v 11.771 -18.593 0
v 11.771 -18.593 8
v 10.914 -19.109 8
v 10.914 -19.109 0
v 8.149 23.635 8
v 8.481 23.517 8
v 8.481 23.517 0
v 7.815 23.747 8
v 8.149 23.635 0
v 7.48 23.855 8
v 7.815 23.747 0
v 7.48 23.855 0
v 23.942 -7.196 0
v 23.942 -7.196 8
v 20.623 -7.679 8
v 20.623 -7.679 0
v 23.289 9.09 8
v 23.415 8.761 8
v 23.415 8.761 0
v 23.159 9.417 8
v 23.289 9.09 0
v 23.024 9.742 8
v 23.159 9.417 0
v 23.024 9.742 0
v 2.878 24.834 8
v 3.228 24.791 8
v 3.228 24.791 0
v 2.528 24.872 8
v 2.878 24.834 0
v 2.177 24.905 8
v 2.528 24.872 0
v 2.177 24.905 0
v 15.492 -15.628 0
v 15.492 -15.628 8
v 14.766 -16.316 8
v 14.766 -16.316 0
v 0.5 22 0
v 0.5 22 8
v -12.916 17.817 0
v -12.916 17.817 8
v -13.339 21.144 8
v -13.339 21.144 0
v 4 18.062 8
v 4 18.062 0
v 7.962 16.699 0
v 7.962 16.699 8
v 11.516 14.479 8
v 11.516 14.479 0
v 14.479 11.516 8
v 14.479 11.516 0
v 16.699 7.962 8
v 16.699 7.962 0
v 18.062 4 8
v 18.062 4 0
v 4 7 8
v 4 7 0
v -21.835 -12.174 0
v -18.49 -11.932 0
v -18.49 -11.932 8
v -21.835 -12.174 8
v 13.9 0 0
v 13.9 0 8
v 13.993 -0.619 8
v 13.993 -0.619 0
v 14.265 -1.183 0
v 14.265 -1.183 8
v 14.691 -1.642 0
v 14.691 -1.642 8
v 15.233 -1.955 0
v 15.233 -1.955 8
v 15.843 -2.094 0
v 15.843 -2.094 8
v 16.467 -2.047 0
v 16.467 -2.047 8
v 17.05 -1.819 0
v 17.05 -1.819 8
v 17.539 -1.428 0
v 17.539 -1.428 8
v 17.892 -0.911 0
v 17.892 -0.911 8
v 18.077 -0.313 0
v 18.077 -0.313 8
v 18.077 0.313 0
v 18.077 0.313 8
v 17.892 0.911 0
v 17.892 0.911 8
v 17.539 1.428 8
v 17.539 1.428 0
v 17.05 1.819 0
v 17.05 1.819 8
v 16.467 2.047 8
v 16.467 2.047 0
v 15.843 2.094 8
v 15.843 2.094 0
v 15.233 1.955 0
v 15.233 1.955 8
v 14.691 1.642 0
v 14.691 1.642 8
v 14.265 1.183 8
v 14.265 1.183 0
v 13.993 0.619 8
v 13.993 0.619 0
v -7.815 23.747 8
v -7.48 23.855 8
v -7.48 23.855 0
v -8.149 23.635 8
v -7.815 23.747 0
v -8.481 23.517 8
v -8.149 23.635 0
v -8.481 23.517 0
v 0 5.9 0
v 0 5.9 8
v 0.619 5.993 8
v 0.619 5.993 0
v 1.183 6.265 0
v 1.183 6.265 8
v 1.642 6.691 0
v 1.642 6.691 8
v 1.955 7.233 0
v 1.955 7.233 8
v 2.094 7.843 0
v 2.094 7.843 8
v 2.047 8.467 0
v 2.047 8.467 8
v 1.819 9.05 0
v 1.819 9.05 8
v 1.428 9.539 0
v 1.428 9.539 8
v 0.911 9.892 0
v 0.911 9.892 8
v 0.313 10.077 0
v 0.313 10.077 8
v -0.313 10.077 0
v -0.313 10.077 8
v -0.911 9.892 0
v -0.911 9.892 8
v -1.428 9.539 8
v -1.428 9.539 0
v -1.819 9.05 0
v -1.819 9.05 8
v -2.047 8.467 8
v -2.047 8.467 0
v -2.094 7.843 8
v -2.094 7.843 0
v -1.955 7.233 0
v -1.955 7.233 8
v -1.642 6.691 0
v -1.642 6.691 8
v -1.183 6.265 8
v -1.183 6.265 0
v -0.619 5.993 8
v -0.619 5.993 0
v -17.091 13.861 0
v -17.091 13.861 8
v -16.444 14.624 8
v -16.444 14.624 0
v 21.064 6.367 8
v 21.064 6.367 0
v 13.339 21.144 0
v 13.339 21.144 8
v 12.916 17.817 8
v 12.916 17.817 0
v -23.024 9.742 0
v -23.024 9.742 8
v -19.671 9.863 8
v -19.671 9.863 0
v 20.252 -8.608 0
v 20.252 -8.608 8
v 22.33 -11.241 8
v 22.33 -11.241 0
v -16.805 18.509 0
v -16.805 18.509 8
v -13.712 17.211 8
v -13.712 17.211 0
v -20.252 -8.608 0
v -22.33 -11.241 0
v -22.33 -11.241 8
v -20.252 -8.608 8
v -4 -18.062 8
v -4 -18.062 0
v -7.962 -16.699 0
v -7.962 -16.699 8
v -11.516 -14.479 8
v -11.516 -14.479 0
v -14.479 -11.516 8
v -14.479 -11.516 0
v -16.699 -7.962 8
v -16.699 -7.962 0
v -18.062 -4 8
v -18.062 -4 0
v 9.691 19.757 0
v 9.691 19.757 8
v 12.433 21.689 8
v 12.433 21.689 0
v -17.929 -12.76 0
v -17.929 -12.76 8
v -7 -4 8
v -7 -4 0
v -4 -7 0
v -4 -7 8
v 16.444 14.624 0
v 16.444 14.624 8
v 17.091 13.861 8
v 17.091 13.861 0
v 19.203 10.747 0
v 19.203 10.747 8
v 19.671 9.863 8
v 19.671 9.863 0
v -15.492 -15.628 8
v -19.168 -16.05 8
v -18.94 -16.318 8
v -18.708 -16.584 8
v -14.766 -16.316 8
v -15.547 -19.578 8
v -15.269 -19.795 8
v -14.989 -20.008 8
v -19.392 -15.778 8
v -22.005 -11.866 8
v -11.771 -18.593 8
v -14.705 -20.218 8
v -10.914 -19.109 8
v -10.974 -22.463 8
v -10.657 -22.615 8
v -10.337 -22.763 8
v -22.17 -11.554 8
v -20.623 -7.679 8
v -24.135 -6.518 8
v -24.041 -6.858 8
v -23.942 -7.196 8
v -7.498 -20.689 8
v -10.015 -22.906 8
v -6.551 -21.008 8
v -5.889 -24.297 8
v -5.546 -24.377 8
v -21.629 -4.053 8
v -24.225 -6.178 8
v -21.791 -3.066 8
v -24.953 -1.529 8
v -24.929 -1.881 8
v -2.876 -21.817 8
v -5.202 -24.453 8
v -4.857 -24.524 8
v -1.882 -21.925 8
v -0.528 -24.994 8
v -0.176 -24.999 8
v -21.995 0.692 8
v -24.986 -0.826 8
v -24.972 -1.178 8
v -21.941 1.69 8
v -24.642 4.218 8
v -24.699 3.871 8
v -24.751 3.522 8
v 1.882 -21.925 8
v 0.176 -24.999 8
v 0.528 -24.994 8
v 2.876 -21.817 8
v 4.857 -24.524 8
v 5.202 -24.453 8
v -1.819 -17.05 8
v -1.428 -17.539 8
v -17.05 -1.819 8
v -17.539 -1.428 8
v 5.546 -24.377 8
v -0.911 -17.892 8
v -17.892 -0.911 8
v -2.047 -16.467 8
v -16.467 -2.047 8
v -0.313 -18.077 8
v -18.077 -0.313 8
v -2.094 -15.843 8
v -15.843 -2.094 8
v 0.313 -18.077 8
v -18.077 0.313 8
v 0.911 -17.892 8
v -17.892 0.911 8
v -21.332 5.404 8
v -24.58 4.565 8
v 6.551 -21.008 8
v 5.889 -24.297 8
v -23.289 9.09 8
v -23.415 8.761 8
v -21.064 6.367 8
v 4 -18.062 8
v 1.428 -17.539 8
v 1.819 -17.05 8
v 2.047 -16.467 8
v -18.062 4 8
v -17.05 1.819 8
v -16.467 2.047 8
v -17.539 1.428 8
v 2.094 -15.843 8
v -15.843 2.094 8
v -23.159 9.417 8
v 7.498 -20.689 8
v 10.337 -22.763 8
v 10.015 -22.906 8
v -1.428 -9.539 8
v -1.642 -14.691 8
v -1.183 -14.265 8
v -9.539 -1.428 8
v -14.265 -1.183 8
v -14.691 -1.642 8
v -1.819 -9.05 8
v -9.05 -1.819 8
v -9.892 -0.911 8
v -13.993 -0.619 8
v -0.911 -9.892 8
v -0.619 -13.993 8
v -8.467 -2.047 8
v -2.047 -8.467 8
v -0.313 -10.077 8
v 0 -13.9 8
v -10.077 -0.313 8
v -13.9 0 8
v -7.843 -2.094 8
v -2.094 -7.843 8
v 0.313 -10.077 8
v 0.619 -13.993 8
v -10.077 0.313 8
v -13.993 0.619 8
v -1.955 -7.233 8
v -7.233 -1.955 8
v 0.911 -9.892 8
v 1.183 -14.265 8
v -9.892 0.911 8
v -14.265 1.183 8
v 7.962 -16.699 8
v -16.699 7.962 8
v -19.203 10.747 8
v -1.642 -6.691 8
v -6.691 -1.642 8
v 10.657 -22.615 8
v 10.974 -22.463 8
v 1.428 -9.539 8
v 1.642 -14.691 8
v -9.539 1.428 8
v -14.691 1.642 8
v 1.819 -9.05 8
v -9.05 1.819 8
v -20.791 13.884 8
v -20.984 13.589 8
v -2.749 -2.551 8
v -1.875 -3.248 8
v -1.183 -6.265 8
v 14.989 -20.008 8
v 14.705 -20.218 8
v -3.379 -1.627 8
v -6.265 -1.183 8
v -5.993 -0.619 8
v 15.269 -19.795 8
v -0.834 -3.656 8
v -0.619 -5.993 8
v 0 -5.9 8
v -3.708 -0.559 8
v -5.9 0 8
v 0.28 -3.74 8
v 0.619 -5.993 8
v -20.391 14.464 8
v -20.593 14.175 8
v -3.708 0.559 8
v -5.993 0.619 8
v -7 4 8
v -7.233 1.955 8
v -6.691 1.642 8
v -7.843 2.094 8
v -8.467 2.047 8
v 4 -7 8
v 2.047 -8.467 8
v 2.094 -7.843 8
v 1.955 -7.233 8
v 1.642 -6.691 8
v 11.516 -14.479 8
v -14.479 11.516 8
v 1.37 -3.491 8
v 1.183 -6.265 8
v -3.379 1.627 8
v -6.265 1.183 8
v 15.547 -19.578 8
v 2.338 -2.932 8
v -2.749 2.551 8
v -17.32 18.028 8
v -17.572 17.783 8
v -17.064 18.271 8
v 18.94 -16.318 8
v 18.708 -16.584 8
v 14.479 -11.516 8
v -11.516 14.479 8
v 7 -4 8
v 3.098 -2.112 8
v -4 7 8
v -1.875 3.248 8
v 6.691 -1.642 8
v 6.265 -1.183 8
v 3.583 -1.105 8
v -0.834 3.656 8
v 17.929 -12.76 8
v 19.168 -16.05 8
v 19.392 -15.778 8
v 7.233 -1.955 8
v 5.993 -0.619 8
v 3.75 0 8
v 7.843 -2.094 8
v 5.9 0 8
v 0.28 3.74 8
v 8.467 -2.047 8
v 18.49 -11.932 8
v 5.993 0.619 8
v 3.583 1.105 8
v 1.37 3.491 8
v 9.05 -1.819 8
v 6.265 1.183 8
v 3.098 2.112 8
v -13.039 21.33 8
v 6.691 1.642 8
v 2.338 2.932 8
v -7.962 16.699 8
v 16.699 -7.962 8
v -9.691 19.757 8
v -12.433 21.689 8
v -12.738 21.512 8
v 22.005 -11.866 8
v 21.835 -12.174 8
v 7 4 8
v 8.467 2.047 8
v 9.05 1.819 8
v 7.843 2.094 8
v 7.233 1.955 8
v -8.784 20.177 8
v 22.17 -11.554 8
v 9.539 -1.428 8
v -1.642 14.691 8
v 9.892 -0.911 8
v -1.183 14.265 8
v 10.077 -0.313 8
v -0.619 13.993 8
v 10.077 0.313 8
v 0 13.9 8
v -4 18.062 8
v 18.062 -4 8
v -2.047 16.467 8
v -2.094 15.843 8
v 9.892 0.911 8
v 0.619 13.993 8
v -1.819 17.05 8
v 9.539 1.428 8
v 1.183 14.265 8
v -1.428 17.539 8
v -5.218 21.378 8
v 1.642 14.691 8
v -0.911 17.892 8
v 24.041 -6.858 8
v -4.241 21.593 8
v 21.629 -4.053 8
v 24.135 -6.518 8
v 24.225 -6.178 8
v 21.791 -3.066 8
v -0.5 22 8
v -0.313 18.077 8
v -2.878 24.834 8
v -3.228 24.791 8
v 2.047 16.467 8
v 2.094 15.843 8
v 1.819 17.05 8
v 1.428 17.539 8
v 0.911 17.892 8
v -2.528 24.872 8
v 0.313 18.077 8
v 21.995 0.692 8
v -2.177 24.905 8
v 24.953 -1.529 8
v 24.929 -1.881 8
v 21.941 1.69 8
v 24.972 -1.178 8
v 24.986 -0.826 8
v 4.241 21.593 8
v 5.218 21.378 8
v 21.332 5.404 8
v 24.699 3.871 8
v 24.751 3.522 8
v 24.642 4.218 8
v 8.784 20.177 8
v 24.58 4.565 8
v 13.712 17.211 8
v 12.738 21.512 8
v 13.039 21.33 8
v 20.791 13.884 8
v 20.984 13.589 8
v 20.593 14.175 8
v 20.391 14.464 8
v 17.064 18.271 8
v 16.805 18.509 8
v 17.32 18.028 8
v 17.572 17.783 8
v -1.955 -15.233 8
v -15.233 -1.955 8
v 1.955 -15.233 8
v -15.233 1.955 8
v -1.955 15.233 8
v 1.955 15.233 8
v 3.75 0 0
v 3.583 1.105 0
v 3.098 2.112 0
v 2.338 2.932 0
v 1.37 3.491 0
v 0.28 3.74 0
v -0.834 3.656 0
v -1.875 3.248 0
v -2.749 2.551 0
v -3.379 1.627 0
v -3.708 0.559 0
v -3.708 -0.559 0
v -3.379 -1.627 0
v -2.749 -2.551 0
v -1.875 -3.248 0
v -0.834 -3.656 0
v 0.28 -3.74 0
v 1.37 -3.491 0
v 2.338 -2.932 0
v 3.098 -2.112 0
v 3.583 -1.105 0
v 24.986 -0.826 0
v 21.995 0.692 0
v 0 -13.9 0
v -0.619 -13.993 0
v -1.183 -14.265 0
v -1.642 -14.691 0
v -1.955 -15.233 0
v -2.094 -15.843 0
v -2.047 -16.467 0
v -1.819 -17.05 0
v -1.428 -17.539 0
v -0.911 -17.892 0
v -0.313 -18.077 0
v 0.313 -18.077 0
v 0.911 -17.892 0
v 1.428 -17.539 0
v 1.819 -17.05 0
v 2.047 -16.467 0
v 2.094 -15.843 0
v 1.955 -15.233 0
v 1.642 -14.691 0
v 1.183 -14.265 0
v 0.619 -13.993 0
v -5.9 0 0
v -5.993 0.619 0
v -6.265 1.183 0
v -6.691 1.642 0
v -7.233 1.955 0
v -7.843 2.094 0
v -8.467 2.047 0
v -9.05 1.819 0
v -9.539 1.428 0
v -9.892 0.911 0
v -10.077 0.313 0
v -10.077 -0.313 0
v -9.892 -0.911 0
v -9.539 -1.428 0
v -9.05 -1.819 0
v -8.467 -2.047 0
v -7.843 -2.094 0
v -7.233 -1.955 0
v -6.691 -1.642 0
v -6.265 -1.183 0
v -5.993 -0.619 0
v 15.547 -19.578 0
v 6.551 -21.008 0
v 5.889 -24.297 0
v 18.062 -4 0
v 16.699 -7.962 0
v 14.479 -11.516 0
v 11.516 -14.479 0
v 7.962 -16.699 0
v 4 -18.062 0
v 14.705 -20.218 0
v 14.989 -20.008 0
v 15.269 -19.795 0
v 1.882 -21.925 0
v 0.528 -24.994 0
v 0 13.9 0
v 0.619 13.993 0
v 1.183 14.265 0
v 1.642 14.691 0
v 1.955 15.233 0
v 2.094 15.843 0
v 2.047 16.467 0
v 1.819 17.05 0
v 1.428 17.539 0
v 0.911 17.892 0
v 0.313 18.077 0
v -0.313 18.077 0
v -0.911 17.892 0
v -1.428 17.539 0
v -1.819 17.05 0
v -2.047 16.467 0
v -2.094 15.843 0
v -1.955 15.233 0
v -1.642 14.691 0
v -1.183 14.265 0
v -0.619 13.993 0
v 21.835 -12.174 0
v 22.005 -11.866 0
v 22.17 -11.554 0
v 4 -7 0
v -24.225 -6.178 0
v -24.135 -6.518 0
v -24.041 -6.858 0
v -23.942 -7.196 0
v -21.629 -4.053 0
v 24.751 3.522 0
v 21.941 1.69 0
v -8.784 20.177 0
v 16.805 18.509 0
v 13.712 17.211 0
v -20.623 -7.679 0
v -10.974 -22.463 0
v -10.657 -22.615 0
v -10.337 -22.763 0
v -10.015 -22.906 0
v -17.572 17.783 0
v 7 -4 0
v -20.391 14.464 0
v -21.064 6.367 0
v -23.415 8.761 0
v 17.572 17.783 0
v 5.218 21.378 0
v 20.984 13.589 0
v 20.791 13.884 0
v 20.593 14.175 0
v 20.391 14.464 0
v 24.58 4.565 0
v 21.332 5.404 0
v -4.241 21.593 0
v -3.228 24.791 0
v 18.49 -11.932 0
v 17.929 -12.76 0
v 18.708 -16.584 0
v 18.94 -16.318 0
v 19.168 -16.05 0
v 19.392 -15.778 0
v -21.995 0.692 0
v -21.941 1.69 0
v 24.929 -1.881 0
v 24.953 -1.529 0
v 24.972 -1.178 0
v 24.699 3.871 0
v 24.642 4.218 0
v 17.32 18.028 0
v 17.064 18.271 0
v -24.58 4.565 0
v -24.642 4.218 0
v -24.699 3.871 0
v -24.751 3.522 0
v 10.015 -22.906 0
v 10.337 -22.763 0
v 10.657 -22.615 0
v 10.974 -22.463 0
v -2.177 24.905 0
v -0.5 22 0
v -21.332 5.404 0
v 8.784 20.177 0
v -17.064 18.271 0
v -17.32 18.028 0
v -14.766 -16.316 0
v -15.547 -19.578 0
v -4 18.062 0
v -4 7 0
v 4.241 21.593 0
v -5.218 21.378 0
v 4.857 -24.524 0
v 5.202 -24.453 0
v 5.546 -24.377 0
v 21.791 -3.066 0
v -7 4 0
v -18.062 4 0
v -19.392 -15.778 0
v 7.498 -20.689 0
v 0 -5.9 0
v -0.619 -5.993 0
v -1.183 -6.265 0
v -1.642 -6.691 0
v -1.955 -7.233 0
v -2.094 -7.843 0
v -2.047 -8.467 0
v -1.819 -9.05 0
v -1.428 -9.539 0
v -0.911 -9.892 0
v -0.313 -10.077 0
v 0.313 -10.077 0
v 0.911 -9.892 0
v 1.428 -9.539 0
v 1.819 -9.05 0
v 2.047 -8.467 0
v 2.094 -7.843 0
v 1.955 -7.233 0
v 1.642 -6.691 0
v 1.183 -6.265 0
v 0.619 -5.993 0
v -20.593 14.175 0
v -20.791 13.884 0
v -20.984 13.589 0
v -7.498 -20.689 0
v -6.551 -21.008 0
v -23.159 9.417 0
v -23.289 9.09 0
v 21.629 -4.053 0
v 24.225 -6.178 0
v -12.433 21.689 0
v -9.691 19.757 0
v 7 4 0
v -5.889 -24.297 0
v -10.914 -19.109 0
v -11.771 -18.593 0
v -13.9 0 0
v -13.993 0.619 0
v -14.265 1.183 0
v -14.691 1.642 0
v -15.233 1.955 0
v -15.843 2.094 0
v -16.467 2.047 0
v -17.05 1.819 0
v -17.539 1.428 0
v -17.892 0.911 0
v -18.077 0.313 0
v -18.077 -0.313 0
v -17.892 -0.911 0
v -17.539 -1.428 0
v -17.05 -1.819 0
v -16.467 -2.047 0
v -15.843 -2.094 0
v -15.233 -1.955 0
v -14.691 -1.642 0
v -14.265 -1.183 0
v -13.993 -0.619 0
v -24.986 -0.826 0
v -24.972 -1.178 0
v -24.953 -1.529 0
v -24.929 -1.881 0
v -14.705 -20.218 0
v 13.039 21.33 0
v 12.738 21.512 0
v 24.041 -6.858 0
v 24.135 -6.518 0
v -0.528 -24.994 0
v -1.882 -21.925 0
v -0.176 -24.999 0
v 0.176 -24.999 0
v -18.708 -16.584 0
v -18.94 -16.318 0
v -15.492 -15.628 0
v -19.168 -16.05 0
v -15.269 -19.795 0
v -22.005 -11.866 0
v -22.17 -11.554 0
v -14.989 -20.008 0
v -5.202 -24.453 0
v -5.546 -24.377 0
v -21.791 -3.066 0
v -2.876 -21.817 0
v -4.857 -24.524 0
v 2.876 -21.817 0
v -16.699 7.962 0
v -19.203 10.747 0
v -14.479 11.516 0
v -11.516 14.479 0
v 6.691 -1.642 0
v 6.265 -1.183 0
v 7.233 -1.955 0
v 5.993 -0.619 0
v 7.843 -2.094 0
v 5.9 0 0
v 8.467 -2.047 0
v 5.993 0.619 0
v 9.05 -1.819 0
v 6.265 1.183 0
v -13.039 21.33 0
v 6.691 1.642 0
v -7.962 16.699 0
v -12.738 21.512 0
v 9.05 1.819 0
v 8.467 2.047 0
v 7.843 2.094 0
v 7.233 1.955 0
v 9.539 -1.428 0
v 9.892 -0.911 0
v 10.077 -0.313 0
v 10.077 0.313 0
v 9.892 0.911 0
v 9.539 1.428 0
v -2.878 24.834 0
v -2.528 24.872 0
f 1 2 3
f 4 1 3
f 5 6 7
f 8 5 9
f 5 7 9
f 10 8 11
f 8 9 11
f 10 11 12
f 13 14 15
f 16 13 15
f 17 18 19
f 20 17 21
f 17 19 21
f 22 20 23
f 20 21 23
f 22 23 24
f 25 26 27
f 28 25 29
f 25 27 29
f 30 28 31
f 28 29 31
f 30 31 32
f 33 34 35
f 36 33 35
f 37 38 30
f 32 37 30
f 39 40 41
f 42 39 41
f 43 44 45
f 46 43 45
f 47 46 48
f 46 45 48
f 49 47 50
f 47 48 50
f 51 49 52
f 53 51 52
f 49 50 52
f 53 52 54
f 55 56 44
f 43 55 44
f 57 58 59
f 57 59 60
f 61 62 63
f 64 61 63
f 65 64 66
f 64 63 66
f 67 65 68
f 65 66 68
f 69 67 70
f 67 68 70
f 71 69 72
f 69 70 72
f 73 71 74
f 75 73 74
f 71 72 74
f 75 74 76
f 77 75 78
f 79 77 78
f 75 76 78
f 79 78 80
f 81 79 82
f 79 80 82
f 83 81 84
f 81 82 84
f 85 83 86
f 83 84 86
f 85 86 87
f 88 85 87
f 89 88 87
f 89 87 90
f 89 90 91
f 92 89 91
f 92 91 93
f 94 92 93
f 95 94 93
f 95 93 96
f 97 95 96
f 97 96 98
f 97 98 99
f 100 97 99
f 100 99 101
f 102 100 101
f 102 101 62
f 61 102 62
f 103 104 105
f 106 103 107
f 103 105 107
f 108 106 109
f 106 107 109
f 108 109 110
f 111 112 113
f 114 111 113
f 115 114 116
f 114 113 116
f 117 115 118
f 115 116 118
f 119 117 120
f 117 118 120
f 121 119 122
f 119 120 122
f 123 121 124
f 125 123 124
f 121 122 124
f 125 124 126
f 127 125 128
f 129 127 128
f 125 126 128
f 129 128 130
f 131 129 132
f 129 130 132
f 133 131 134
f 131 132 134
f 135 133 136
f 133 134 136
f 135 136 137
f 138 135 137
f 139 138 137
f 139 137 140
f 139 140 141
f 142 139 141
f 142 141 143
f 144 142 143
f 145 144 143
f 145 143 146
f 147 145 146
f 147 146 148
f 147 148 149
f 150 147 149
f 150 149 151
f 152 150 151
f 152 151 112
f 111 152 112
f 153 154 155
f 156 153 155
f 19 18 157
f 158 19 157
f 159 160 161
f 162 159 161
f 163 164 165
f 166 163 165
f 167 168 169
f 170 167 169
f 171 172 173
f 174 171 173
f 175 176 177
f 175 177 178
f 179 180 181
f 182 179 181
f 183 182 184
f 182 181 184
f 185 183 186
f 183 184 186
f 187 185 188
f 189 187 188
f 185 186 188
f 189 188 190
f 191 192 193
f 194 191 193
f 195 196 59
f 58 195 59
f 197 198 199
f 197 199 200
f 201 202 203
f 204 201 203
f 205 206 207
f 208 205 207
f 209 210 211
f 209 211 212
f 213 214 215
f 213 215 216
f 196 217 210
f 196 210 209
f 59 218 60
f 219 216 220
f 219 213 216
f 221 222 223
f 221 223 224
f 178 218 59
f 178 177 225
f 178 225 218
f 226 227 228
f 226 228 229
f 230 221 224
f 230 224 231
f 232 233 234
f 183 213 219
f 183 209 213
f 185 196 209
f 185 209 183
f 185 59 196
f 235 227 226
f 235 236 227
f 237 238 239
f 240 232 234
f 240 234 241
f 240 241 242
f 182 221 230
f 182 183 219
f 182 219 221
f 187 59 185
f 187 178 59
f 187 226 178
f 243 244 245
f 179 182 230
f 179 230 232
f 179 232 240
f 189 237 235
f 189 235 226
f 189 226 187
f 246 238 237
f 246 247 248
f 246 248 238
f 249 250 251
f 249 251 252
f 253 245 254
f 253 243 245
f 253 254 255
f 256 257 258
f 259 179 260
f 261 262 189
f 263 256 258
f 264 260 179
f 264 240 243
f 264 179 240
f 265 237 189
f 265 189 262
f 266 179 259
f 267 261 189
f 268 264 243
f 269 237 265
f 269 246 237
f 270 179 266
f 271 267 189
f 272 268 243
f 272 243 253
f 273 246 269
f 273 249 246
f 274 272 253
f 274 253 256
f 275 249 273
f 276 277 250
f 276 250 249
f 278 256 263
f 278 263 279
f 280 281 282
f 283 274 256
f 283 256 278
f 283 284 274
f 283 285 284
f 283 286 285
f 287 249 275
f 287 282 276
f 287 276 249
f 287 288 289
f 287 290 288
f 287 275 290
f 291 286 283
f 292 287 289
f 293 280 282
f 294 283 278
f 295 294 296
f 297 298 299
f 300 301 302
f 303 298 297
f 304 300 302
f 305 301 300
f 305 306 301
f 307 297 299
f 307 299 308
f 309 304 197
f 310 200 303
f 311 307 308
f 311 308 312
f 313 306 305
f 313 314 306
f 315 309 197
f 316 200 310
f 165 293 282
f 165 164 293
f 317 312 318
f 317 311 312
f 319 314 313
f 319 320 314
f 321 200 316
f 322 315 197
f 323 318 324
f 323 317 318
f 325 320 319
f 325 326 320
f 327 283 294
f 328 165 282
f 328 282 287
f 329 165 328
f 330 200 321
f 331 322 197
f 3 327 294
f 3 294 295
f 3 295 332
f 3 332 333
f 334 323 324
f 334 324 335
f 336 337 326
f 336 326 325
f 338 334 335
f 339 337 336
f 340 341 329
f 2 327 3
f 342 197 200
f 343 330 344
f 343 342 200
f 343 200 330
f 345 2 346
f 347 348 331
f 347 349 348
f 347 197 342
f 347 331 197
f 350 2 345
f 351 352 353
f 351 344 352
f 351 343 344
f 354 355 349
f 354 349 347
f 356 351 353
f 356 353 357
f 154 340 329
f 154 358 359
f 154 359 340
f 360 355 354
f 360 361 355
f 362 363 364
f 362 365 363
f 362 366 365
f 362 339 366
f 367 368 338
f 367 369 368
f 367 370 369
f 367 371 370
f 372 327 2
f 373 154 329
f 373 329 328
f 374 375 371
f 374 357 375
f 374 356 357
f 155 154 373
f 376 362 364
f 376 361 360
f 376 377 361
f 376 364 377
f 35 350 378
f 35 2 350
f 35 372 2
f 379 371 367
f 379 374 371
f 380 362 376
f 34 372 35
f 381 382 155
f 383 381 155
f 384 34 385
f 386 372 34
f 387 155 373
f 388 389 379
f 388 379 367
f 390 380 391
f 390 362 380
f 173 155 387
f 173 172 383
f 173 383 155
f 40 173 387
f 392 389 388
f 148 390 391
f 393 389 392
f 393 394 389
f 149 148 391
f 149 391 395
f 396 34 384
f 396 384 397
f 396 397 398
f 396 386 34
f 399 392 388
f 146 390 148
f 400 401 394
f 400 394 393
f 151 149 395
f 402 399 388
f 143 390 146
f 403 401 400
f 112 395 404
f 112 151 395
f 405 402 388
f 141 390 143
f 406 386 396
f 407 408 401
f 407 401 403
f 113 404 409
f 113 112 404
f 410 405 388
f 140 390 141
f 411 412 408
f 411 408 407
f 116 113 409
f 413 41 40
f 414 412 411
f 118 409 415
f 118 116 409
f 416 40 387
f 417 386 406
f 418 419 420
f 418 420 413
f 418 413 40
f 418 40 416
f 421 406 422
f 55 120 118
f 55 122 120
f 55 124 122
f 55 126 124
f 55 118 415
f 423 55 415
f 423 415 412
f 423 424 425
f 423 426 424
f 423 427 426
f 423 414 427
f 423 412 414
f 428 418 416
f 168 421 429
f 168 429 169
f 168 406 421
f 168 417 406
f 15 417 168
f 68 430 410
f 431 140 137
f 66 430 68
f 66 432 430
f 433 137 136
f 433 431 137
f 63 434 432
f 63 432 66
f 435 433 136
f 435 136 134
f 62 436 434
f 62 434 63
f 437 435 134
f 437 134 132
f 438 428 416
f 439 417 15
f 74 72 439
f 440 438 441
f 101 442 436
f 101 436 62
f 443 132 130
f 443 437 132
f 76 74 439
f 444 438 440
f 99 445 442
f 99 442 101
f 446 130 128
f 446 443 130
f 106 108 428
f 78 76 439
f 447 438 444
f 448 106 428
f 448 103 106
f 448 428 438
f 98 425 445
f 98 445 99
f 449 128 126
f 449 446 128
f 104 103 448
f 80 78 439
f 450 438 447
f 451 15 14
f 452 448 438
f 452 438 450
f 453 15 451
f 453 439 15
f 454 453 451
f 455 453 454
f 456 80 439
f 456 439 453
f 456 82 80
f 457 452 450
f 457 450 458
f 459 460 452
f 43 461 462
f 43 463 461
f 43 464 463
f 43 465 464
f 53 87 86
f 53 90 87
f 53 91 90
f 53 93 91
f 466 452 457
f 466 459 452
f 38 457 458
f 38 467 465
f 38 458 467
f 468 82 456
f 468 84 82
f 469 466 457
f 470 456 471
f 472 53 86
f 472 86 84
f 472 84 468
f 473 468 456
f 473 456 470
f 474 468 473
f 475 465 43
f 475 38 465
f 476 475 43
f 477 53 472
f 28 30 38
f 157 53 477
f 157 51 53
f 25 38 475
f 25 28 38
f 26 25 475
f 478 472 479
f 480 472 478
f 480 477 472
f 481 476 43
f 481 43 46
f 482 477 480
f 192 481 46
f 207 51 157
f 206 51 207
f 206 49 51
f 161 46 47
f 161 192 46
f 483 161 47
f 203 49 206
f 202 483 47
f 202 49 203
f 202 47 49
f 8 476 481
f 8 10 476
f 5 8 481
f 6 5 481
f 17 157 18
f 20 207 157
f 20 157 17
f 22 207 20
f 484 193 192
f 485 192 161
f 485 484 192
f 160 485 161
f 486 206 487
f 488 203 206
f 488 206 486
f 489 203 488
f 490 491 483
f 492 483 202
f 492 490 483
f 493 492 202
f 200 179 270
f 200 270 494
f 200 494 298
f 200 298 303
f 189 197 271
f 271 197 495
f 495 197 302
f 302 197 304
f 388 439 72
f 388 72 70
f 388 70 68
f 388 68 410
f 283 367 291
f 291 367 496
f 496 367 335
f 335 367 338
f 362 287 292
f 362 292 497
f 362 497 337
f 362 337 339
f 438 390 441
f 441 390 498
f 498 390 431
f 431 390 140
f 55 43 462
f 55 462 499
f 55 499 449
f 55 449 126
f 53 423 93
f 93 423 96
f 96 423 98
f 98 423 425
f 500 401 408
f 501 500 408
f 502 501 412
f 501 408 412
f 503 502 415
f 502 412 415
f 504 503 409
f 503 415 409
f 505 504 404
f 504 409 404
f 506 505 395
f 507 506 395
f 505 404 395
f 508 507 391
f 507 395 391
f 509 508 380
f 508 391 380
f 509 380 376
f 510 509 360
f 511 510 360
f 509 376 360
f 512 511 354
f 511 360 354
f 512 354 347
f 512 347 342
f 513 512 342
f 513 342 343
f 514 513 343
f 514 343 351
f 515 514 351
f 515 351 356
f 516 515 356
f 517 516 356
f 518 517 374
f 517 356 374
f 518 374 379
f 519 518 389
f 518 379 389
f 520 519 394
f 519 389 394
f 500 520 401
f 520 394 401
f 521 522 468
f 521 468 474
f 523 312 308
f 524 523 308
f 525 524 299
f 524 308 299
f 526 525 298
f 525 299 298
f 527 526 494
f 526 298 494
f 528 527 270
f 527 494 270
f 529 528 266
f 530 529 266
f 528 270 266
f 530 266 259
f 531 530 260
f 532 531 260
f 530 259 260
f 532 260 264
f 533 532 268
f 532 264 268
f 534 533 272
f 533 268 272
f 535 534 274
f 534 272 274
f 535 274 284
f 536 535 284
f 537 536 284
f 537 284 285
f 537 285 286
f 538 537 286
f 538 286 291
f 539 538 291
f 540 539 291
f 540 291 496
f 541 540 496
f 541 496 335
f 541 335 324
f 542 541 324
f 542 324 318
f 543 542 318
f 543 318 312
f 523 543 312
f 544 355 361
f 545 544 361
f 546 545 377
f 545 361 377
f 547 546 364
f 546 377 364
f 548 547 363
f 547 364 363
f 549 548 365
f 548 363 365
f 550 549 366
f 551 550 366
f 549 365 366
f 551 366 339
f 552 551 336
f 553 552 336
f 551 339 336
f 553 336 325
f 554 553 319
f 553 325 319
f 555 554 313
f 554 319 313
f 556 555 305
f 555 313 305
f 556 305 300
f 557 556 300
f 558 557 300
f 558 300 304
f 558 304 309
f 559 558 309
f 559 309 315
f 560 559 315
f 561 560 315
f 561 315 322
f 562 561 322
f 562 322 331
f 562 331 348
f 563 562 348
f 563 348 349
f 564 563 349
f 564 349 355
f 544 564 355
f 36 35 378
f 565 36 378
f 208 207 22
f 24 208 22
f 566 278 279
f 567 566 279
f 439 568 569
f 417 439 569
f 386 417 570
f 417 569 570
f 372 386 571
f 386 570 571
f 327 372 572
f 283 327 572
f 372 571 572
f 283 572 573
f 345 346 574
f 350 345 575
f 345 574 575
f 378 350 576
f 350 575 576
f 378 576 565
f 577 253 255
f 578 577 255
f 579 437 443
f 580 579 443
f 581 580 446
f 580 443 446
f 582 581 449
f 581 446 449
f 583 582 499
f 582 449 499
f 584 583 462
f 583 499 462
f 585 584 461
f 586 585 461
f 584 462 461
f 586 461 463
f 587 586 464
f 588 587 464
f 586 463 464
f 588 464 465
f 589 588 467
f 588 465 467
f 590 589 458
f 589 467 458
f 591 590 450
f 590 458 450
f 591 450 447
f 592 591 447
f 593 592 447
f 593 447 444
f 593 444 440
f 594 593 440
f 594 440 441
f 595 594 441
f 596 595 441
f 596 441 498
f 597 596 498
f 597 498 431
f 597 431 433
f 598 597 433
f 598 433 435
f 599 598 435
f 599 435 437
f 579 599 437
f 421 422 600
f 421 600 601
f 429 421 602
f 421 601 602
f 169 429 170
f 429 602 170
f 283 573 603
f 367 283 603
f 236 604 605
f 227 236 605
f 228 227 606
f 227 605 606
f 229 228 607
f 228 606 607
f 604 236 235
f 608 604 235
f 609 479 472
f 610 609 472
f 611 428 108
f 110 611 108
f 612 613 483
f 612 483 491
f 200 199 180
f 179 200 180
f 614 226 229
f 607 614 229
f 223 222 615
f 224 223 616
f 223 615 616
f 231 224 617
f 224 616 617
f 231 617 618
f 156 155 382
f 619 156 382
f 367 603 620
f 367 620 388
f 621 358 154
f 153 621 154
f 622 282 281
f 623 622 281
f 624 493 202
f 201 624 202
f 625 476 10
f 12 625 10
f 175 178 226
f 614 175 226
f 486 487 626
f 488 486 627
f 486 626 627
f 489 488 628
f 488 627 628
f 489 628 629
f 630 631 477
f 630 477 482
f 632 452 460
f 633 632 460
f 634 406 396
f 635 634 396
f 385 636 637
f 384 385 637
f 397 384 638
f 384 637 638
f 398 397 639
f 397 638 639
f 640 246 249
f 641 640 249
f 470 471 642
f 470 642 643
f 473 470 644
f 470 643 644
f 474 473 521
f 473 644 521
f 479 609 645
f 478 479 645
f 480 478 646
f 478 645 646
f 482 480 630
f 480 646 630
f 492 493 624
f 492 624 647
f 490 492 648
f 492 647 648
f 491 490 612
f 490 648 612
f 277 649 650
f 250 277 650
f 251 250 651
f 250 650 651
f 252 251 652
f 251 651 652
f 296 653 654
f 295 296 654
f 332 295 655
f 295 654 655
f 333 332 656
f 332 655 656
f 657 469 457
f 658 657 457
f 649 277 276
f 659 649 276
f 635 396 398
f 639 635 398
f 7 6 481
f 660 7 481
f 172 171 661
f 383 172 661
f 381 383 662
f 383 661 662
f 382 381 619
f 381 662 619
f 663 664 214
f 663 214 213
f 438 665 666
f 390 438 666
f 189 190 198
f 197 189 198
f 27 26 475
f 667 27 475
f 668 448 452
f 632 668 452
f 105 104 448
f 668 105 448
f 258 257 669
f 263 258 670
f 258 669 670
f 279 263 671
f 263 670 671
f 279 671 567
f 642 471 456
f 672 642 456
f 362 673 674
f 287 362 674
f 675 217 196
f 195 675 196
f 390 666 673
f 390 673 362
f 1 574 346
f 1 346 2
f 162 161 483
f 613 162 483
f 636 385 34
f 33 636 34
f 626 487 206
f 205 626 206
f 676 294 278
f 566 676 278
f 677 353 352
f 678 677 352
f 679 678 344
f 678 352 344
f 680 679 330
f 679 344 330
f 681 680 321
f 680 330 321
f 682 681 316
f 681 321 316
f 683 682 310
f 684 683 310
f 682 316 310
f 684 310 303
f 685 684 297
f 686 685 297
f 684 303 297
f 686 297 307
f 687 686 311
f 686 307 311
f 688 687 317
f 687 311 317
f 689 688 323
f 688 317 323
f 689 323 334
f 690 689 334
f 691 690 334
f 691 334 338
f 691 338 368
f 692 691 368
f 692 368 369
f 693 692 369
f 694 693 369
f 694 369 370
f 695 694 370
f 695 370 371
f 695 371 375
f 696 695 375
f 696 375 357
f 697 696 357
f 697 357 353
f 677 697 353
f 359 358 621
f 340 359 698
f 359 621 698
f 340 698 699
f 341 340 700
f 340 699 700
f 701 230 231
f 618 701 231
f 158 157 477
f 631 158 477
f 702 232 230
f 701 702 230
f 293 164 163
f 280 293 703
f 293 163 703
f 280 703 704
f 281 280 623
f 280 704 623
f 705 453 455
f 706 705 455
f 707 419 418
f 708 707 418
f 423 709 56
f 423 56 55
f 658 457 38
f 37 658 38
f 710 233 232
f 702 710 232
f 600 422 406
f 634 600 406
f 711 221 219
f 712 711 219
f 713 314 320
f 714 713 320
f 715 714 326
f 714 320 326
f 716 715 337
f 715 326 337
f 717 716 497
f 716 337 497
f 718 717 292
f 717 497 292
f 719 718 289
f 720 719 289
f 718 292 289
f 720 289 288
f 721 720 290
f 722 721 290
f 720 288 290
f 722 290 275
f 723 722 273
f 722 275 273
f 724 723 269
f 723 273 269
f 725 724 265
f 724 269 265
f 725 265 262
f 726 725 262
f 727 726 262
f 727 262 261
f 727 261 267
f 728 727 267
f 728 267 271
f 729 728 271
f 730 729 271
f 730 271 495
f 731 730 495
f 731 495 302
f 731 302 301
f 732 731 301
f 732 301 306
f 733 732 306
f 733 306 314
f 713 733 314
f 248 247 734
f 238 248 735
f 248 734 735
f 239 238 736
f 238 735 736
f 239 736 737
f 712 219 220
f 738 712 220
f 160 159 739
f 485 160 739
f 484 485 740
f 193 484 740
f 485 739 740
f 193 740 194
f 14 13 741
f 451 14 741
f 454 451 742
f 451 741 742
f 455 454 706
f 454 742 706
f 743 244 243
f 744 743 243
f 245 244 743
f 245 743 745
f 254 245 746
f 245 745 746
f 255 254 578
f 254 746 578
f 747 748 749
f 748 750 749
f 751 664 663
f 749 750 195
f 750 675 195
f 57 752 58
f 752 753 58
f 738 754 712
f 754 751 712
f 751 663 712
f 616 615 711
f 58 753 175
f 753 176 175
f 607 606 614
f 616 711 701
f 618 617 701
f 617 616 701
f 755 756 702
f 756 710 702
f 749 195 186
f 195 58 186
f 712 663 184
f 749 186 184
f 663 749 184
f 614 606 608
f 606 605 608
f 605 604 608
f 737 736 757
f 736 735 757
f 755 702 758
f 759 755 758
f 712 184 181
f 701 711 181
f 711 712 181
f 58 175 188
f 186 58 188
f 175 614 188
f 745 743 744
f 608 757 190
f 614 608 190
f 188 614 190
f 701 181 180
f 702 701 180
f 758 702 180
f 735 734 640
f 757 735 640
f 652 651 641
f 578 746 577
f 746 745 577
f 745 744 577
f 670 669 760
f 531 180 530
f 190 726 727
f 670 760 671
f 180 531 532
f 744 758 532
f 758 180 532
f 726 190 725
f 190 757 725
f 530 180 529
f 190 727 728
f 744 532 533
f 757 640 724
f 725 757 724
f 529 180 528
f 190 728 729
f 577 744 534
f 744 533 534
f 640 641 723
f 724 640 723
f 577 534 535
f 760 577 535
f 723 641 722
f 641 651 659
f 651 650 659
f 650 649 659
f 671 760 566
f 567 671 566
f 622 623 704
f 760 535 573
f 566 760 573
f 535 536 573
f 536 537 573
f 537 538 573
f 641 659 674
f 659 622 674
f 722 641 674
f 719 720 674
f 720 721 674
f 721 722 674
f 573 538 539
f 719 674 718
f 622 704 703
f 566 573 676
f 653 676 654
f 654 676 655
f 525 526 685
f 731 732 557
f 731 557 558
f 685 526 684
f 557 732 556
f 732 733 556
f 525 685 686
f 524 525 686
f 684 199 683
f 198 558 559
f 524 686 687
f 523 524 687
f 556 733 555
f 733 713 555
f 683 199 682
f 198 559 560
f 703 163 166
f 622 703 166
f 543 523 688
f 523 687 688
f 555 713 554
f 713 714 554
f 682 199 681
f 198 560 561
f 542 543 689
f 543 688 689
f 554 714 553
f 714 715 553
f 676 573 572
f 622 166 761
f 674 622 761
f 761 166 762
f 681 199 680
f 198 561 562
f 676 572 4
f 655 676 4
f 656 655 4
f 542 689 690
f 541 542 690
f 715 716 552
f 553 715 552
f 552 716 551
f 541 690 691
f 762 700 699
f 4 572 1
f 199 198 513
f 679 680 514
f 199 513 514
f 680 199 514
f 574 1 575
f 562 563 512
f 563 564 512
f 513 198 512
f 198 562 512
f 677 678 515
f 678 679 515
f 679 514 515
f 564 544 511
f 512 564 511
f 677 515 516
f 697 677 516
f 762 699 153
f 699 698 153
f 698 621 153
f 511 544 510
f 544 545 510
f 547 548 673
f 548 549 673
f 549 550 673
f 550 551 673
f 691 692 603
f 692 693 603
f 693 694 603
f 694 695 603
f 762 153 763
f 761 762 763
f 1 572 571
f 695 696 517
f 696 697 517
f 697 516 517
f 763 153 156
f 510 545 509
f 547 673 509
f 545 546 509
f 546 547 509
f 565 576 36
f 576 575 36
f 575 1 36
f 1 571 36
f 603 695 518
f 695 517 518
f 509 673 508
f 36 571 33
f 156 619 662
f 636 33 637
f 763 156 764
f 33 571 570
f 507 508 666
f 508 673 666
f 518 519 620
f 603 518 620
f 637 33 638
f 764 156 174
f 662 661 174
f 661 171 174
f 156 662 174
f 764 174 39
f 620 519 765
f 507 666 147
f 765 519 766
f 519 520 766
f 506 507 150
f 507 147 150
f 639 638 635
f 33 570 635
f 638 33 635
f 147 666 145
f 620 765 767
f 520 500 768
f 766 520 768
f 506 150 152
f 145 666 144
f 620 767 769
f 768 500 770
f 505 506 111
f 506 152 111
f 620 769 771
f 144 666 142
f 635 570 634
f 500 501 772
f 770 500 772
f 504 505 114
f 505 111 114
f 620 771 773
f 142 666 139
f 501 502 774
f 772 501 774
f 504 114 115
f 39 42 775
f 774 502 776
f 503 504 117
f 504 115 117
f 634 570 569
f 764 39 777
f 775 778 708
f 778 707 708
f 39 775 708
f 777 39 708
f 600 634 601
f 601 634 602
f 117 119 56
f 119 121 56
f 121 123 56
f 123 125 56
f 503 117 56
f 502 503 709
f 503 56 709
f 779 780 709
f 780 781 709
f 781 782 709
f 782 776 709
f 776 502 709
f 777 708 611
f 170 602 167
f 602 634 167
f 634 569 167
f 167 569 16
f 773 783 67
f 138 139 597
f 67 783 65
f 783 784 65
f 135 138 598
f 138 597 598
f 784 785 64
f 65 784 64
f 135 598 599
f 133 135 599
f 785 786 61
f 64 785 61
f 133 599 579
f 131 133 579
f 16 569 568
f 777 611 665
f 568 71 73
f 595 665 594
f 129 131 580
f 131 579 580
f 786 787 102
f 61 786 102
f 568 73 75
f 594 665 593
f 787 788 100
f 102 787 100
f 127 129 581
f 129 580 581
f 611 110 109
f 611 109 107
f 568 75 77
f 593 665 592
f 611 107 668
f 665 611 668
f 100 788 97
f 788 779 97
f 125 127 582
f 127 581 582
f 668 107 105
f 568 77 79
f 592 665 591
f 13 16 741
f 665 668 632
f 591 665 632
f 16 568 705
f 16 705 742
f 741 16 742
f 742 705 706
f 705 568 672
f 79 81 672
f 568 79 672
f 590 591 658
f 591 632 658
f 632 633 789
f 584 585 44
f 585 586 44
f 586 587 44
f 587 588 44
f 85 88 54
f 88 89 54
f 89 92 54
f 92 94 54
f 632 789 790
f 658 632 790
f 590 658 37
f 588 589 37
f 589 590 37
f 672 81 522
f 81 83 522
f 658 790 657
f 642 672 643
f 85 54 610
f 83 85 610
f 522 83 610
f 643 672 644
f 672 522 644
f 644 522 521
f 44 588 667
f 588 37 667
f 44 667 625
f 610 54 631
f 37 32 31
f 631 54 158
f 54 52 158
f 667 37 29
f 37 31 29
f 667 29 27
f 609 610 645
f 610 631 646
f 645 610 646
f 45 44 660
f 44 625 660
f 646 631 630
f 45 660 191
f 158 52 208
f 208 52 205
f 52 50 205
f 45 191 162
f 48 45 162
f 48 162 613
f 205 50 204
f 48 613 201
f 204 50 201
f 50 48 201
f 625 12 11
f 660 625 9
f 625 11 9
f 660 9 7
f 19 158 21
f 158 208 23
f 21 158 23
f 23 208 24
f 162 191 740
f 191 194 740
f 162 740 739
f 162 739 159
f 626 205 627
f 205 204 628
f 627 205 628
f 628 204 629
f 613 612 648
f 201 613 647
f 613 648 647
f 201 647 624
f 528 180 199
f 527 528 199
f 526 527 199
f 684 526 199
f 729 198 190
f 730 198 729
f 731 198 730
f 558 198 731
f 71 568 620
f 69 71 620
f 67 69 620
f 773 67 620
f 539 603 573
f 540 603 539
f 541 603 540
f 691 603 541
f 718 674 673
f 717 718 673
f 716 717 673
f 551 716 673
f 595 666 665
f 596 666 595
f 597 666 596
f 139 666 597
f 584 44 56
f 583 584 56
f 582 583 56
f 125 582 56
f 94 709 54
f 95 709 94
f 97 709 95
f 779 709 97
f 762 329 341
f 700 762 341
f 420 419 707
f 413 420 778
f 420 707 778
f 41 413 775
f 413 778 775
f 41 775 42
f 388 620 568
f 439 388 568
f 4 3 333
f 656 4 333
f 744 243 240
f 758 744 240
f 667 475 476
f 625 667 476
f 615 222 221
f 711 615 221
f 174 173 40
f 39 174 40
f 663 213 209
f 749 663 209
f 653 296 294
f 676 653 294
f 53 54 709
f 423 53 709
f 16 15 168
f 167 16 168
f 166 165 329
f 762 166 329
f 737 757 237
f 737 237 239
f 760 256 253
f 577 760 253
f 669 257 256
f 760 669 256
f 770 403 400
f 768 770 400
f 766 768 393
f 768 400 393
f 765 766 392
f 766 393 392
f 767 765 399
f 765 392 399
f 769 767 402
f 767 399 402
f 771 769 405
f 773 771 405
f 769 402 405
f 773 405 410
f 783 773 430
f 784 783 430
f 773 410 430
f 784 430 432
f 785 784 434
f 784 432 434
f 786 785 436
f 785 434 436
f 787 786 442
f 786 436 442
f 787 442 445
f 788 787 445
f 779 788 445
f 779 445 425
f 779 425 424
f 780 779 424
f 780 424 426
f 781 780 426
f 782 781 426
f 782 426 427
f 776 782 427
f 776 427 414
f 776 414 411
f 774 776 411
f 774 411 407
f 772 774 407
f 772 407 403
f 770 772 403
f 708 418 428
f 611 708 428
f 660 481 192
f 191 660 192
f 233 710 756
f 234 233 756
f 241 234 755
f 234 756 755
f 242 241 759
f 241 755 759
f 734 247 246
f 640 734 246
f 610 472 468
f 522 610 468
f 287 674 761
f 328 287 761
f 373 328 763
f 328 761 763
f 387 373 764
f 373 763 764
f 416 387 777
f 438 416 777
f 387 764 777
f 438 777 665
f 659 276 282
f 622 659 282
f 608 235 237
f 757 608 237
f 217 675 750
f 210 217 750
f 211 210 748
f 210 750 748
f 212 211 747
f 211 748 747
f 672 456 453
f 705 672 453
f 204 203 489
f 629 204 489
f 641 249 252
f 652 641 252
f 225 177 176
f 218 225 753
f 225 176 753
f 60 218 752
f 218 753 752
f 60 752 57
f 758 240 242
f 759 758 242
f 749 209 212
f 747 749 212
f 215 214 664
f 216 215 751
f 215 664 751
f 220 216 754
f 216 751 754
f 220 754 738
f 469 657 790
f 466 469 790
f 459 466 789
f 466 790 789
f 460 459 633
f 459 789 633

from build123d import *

# Parameters (mm, degrees)
SKETCH1_R           = 25
BOSS_EXTRUDE1_DEPTH = 8
CHAMFER1_SIZE       = 3
SKETCH2_R           = 3.75
SKETCH2_R_2         = 2.1
CUT_EXTRUDE1_DEPTH  = 10
CUT_EXTRUDE4_DEPTH  = 10
CIRPATTERN1_COUNT   = 29
CIRPATTERN2_COUNT   = 4


with BuildPart() as part:
    # Sketch1 → Boss-Extrude1 (new body)
    with BuildSketch(Plane.XY):
        Circle(SKETCH1_R)
        with BuildLine():
            Line((-4, 18.062391868), (-4, 4))
            Line((-4, 4), (-18.062391868, 4))
            ThreePointArc((-18.062391868, 4), (-13.081475452, 13.081475452), (-4, 18.062391868))
        make_face(mode=Mode.SUBTRACT)
        with BuildLine():
            Line((-18.062391868, -4), (-4, -4))
            Line((-4, -4), (-4, -18.062391868))
            ThreePointArc((-4, -18.062391868), (-13.081475452, -13.081475452), (-18.062391868, -4))
        make_face(mode=Mode.SUBTRACT)
        with BuildLine():
            Line((4, -18.062391868), (4, -4))
            Line((4, -4), (18.062391868, -4))
            ThreePointArc((18.062391868, -4), (13.081475452, -13.081475452), (4, -18.062391868))
        make_face(mode=Mode.SUBTRACT)
        with BuildLine():
            Line((18.062391868, 4), (4, 4))
            Line((4, 4), (4, 18.062391868))
            ThreePointArc((4, 18.062391868), (13.081475452, 13.081475452), (18.062391868, 4))
        make_face(mode=Mode.SUBTRACT)
    extrude(amount=BOSS_EXTRUDE1_DEPTH)

    # Chamfer1
    chamfer1_edges = [part.edges().sort_by_distance(p)[0] for p in [
        (-4, 4, 4),
        (4, 4, 4),
        (-4, -4, 4),
        (4, -4, 4),
    ]]
    chamfer(chamfer1_edges, length=CHAMFER1_SIZE)

    # Sketch2 → Cut-Extrude1 (cut)
    with BuildSketch(Plane.XY.offset(8)):
        Circle(SKETCH2_R)
        with Locations((-8, 0)):
            Circle(SKETCH2_R_2)
        with Locations((-16, 0)):
            Circle(SKETCH2_R_2)
    cut_extrude1 = extrude(amount=-CUT_EXTRUDE1_DEPTH, mode=Mode.SUBTRACT)

    # Sketch3 → Cut-Extrude4 (cut)
    with BuildSketch(Plane.XY.offset(8)):
        Polygon((-2.809401077, 26), (-0.5, 22), (0.5, 22), (2.809401077, 26), align=None)
    cut_extrude4 = extrude(amount=-CUT_EXTRUDE4_DEPTH, mode=Mode.SUBTRACT)

    # CirPattern1: Cut-Extrude4 ×29 about axis
    cirpattern1_axis = Axis((0, 0, 0), (0, 0, 1))
    for i in range(1, CIRPATTERN1_COUNT):
        add(cut_extrude4.rotate(cirpattern1_axis, i * 360 / CIRPATTERN1_COUNT), mode=Mode.SUBTRACT)

    # CirPattern2: Cut-Extrude1 ×4 about axis
    cirpattern2_axis = Axis((0, 0, 0), (0, 0, 1))
    for i in range(1, CIRPATTERN2_COUNT):
        add(cut_extrude1.rotate(cirpattern2_axis, i * 360 / CIRPATTERN2_COUNT), mode=Mode.SUBTRACT)


solid = part.part
